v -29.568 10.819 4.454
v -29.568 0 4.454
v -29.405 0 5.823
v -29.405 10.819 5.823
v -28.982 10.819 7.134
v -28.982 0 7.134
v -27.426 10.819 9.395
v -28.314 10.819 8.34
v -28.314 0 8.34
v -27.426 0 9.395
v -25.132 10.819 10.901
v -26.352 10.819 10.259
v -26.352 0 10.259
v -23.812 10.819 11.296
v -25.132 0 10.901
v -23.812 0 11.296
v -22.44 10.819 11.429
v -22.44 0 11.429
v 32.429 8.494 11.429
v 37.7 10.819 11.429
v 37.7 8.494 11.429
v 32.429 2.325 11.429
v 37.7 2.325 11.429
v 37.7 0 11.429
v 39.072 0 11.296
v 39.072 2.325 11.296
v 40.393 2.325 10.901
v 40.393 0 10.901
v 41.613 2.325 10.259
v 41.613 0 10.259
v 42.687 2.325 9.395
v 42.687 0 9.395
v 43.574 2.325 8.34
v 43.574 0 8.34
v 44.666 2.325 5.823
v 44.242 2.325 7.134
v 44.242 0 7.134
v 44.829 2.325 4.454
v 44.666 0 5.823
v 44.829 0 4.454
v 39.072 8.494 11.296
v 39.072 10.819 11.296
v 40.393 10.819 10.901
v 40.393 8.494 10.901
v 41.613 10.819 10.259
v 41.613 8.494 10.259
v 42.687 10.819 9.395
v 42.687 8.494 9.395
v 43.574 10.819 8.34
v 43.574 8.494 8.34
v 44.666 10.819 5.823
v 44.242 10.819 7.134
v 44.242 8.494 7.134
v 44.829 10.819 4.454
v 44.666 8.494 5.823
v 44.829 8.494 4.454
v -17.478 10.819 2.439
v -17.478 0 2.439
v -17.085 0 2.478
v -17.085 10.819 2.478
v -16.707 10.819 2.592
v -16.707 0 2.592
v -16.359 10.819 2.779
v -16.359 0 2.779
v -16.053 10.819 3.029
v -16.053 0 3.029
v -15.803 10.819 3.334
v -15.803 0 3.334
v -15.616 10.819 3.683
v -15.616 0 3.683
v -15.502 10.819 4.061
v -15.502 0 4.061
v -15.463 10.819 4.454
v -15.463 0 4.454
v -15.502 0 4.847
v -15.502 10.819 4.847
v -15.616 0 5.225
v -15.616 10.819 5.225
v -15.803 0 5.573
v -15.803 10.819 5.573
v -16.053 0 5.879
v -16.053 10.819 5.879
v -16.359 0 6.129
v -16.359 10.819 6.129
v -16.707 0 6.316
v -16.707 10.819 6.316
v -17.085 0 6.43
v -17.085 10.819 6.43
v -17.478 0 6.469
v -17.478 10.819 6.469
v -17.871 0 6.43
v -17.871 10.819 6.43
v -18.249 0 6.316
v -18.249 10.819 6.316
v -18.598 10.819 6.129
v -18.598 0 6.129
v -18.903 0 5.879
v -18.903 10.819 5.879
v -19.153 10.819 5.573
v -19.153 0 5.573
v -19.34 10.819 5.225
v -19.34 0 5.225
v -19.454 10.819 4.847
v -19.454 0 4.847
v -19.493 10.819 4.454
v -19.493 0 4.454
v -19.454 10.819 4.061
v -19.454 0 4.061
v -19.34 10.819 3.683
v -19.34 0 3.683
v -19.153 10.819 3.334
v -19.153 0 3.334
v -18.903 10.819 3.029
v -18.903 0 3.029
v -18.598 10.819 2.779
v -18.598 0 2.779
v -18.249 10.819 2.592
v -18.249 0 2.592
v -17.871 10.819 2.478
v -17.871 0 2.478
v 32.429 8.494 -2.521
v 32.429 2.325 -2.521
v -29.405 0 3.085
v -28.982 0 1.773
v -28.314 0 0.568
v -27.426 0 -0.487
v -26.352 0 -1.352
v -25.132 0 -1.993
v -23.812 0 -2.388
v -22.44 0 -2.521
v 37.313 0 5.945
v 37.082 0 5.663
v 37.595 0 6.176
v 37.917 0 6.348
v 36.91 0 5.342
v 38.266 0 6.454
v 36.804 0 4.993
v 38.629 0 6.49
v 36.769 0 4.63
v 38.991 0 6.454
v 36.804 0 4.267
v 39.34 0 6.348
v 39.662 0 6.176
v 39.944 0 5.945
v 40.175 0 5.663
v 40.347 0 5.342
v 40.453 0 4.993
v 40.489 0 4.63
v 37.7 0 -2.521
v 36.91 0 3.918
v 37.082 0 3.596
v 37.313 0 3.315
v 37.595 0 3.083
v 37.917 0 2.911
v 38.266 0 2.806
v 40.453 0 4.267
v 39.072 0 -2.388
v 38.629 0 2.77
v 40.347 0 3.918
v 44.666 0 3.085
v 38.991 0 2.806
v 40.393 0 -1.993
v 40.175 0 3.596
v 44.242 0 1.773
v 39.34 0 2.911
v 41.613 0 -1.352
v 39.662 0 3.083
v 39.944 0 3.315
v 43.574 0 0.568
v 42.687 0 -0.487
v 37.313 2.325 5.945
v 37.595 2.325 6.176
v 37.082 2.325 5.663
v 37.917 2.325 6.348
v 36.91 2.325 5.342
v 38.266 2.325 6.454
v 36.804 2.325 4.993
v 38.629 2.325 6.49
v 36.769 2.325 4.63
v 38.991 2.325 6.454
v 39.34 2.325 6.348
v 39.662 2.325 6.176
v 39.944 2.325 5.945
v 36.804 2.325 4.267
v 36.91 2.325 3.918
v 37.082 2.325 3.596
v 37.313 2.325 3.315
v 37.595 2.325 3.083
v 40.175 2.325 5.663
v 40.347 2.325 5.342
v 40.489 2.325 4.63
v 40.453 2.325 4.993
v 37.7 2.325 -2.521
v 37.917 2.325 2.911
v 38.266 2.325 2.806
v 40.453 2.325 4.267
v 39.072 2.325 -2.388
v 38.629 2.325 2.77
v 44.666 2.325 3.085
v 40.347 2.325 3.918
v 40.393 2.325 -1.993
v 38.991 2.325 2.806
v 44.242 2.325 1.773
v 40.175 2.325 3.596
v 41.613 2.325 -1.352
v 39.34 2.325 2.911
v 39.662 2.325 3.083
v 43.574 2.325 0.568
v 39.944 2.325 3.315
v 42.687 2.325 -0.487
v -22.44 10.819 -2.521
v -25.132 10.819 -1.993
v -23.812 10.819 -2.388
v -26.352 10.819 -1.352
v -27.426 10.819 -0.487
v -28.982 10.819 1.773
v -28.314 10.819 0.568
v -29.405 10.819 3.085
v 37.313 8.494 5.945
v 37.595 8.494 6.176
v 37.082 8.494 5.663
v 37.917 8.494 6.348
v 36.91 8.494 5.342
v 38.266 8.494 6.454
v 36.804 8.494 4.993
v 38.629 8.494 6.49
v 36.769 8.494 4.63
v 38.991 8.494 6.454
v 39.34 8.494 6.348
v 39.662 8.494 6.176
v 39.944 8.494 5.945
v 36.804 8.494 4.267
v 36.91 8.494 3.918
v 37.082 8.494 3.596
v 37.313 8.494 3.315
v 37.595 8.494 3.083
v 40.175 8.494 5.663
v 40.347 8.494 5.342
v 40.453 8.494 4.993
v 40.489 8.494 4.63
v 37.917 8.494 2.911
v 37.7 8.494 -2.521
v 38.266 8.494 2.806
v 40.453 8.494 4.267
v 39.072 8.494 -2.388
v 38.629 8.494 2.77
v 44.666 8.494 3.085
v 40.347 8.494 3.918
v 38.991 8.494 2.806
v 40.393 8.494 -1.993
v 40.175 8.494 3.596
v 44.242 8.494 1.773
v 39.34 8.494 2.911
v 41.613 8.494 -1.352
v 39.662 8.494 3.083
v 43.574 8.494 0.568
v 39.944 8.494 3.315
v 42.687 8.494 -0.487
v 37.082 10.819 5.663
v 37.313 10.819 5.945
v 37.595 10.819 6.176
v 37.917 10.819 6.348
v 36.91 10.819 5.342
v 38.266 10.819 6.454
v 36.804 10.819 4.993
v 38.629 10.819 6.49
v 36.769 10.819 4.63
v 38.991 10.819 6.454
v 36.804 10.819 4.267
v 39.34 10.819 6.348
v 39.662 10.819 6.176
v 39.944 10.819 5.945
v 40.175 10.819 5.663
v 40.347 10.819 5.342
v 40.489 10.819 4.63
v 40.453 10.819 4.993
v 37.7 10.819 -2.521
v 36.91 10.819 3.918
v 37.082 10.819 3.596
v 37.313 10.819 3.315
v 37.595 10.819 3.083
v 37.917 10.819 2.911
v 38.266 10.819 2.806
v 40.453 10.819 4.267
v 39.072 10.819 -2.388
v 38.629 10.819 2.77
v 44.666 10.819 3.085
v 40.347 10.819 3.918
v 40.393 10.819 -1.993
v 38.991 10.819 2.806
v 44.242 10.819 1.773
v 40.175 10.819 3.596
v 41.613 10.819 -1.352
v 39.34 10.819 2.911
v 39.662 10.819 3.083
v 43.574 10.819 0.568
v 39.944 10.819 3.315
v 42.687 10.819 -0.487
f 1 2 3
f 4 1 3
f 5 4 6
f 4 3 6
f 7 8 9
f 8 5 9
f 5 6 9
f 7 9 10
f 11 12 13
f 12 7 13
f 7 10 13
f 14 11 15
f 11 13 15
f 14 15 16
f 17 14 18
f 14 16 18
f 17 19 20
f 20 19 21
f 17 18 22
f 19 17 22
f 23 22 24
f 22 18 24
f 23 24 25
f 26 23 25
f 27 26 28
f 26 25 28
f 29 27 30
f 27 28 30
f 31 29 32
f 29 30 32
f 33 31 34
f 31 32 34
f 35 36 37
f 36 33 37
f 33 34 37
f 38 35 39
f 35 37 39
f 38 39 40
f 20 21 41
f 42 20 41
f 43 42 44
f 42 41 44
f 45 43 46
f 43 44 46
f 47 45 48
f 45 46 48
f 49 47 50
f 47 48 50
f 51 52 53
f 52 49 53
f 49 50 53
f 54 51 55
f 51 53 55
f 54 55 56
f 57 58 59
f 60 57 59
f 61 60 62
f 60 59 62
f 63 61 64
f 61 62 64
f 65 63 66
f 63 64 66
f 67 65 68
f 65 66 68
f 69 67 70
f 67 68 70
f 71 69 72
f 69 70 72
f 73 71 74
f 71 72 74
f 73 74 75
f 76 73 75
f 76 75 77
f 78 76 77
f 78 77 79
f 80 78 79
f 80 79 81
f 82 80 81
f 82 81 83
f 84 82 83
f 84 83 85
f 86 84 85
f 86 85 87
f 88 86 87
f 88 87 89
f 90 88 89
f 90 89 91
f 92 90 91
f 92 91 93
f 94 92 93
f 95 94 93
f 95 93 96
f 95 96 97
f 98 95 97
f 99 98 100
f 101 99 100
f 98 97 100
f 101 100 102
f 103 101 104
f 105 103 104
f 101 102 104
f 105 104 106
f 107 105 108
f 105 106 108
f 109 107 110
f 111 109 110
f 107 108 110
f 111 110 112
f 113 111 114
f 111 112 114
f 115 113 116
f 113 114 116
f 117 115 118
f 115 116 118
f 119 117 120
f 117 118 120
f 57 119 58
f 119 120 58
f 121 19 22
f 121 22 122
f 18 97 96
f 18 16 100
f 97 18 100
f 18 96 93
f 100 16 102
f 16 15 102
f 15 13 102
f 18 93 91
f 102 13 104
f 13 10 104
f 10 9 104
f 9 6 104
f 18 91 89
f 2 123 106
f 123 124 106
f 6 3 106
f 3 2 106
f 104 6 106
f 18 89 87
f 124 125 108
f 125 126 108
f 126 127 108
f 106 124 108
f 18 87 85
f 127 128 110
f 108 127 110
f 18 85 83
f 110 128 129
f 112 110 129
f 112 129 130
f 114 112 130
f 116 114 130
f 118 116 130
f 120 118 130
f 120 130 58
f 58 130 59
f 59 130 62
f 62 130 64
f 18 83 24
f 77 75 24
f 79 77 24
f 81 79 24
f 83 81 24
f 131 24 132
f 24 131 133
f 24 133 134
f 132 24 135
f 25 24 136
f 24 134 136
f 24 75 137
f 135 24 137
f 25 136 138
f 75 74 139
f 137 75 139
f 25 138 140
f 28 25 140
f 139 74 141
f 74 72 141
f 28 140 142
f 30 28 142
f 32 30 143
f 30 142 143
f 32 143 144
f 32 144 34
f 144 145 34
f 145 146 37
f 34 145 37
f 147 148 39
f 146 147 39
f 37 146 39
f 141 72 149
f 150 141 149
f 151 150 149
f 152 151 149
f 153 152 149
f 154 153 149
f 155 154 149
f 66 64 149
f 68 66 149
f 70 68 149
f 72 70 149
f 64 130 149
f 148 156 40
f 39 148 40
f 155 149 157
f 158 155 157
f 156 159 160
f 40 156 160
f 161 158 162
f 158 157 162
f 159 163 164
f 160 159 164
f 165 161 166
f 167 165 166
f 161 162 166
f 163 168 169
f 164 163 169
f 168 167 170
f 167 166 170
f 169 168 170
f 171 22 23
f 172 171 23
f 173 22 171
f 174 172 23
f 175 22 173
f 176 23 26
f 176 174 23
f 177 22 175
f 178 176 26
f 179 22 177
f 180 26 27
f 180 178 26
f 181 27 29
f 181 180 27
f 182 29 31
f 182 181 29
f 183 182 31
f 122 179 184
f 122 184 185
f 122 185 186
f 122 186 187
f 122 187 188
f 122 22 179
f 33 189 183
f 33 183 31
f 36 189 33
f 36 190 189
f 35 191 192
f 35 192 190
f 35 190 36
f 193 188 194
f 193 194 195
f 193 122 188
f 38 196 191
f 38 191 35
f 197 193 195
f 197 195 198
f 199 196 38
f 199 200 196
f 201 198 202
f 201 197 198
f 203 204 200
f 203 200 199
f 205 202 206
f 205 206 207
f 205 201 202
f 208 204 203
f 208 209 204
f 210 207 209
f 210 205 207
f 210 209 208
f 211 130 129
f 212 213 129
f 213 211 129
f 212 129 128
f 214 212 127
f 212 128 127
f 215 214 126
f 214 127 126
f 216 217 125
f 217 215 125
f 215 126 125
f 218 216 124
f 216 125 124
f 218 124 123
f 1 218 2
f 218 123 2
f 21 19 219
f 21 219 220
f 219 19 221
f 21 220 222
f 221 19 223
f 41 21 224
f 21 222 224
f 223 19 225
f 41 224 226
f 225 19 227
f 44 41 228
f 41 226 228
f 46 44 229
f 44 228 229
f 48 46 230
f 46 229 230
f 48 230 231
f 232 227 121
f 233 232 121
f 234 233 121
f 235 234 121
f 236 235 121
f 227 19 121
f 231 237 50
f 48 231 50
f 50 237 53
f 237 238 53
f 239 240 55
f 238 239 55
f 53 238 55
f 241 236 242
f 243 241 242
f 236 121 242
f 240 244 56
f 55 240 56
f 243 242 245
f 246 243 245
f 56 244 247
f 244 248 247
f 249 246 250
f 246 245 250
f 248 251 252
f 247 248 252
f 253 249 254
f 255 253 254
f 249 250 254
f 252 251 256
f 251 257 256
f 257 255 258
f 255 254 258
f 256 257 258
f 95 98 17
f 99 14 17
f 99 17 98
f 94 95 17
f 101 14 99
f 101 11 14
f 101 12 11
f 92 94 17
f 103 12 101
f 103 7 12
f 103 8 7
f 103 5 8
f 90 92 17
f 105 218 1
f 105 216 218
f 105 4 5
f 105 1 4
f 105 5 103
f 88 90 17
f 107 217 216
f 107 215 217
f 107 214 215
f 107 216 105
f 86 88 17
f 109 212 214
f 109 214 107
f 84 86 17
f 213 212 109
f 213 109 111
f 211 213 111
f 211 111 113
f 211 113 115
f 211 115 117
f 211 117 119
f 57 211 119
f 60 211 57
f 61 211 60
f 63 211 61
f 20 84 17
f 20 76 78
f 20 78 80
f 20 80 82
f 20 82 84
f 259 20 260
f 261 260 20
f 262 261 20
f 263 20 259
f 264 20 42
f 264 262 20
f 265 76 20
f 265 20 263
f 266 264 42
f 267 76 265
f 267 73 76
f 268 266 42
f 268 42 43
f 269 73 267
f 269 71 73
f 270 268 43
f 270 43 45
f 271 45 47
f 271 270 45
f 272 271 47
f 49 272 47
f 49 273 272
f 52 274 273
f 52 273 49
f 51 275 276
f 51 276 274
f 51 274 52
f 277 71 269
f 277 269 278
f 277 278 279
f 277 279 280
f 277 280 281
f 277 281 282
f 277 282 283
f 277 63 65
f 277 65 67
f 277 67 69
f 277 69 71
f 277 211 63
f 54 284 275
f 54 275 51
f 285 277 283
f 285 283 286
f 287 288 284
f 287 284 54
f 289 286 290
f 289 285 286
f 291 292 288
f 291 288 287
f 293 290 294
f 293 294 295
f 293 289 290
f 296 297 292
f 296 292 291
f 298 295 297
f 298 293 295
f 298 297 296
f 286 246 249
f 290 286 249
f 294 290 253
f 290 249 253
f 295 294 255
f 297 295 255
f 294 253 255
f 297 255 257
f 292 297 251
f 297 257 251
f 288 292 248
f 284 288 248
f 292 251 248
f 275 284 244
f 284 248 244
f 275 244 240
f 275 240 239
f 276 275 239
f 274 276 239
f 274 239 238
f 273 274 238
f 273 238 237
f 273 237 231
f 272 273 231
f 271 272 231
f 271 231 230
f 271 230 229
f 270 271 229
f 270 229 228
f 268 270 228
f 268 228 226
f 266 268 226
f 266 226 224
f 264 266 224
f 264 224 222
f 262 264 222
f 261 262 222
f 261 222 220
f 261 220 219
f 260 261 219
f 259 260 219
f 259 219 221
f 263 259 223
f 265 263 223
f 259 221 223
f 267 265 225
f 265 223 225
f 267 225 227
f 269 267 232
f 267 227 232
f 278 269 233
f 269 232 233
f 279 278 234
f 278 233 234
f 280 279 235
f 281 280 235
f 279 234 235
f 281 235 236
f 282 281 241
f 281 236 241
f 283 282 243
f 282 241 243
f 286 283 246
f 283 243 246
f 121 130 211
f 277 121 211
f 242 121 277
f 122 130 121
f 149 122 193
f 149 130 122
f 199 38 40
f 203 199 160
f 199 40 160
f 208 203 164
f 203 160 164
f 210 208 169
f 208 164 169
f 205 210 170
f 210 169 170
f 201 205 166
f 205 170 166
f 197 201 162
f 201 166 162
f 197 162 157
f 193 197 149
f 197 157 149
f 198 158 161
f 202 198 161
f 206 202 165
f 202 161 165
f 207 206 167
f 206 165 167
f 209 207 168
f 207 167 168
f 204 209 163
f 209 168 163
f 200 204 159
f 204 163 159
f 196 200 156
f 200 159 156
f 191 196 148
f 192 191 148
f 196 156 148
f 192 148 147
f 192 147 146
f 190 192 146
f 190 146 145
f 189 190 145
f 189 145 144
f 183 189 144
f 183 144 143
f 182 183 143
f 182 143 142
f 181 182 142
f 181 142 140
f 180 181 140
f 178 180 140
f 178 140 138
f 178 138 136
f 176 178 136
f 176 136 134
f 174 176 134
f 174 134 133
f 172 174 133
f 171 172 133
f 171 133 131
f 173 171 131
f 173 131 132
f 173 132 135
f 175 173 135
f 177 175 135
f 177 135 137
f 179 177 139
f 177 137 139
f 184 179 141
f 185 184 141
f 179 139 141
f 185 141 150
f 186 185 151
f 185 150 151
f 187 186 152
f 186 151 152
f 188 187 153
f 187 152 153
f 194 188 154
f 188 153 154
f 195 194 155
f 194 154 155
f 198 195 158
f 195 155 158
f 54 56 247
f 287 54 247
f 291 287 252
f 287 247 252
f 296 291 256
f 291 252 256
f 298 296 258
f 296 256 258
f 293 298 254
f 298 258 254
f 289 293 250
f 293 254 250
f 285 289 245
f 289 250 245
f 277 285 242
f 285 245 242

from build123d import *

# Parameters (mm, degrees)
SKETCH1_W           = 240
SKETCH1_H           = 45
BOSS_EXTRUDE1_DEPTH = 34.9
FILLET1_R           = 23
CUT_EXTRUDE1_START  = -7.5
SKETCH2_W           = 49.564850137
SKETCH2_H           = 45.01227926
CUT_EXTRUDE1_DEPTH  = 19.9
SKETCH3_R           = 6
CUT_EXTRUDE2_DEPTH  = 154.260575491
SKETCH4_R           = 6.5
CUT_EXTRUDE3_DEPTH  = 154.260575491
SCALE1_SCALE        = 0.31


with BuildPart() as part:
    # Sketch1 → Boss-Extrude1 (new body)
    with BuildSketch(Plane(origin=(0, 0, 0), x_dir=(1, 0, 0), z_dir=(0, 1, 0))):
        with Locations((24.613815765, -14.36746988)):
            Rectangle(SKETCH1_W, SKETCH1_H)
    extrude(amount=BOSS_EXTRUDE1_DEPTH)

    # Fillet1
    # the kernel refuses this fillet: 23 mm, written as the material it takes off along each edge
    with BuildSketch(Plane(origin=(-95.386184235, -57.5, 36.86746988), x_dir=(1, 0, 0), z_dir=(0, 1, 0))) as fillet1_piece_1:
        with BuildLine():
            CenterArc((FILLET1_R, FILLET1_R), FILLET1_R, 180, 90)
            Line((0, FILLET1_R), (0, 0))
            Line((0, 0), (FILLET1_R, 0))
        make_face()
    extrude(amount=149.9, mode=Mode.SUBTRACT)
    with BuildSketch(Plane(origin=(-95.386184235, -57.5, -8.13253012), x_dir=(1, 0, 0), z_dir=(0, 1, 0)), Plane(origin=(144.613815765, -57.5, 36.86746988), x_dir=(-1, 0, 0), z_dir=(0, 1, 0)), Plane(origin=(144.613815765, -57.5, -8.13253012), x_dir=(0, 0, 1), z_dir=(0, 1, 0))) as fillet1_piece_2:
        with BuildLine():
            CenterArc((FILLET1_R, -FILLET1_R), FILLET1_R, 90, 90)
            Line((0, -FILLET1_R), (0, 0))
            Line((0, 0), (FILLET1_R, 0))
        make_face()
    extrude(amount=149.9, mode=Mode.SUBTRACT)

    # Sketch2 → Cut-Extrude1 (cut)
    with BuildSketch(Plane(origin=(0, 34.9, 0), x_dir=(1, 0, 0), z_dir=(0, 1, 0)).offset(CUT_EXTRUDE1_START)):
        with Locations((129.390805409, -14.37360951)):
            Rectangle(SKETCH2_W, SKETCH2_H)
    extrude(amount=-CUT_EXTRUDE1_DEPTH, mode=Mode.SUBTRACT)

    # Sketch3 → Cut-Extrude2 (cut, through all)
    with BuildSketch(Plane.XZ):
        with Locations(Location((124.60838034, 14.935006331, 0), (0, 0, 270))):
            Circle(SKETCH3_R)
    extrude(amount=-CUT_EXTRUDE2_DEPTH, mode=Mode.SUBTRACT)

    # Sketch4 → Cut-Extrude3 (cut, through all)
    with BuildSketch(Plane.XZ):
        with Locations(Location((-56.380748811, 14.36746988, 0), (0, 0, 270))):
            Circle(SKETCH4_R)
    extrude(amount=-CUT_EXTRUDE3_DEPTH, mode=Mode.SUBTRACT)


with BuildPart() as part_1:
    # Scale1: scaled about (0, 0, 0)
    add(part.part.scale(SCALE1_SCALE))


solid = part_1.part
